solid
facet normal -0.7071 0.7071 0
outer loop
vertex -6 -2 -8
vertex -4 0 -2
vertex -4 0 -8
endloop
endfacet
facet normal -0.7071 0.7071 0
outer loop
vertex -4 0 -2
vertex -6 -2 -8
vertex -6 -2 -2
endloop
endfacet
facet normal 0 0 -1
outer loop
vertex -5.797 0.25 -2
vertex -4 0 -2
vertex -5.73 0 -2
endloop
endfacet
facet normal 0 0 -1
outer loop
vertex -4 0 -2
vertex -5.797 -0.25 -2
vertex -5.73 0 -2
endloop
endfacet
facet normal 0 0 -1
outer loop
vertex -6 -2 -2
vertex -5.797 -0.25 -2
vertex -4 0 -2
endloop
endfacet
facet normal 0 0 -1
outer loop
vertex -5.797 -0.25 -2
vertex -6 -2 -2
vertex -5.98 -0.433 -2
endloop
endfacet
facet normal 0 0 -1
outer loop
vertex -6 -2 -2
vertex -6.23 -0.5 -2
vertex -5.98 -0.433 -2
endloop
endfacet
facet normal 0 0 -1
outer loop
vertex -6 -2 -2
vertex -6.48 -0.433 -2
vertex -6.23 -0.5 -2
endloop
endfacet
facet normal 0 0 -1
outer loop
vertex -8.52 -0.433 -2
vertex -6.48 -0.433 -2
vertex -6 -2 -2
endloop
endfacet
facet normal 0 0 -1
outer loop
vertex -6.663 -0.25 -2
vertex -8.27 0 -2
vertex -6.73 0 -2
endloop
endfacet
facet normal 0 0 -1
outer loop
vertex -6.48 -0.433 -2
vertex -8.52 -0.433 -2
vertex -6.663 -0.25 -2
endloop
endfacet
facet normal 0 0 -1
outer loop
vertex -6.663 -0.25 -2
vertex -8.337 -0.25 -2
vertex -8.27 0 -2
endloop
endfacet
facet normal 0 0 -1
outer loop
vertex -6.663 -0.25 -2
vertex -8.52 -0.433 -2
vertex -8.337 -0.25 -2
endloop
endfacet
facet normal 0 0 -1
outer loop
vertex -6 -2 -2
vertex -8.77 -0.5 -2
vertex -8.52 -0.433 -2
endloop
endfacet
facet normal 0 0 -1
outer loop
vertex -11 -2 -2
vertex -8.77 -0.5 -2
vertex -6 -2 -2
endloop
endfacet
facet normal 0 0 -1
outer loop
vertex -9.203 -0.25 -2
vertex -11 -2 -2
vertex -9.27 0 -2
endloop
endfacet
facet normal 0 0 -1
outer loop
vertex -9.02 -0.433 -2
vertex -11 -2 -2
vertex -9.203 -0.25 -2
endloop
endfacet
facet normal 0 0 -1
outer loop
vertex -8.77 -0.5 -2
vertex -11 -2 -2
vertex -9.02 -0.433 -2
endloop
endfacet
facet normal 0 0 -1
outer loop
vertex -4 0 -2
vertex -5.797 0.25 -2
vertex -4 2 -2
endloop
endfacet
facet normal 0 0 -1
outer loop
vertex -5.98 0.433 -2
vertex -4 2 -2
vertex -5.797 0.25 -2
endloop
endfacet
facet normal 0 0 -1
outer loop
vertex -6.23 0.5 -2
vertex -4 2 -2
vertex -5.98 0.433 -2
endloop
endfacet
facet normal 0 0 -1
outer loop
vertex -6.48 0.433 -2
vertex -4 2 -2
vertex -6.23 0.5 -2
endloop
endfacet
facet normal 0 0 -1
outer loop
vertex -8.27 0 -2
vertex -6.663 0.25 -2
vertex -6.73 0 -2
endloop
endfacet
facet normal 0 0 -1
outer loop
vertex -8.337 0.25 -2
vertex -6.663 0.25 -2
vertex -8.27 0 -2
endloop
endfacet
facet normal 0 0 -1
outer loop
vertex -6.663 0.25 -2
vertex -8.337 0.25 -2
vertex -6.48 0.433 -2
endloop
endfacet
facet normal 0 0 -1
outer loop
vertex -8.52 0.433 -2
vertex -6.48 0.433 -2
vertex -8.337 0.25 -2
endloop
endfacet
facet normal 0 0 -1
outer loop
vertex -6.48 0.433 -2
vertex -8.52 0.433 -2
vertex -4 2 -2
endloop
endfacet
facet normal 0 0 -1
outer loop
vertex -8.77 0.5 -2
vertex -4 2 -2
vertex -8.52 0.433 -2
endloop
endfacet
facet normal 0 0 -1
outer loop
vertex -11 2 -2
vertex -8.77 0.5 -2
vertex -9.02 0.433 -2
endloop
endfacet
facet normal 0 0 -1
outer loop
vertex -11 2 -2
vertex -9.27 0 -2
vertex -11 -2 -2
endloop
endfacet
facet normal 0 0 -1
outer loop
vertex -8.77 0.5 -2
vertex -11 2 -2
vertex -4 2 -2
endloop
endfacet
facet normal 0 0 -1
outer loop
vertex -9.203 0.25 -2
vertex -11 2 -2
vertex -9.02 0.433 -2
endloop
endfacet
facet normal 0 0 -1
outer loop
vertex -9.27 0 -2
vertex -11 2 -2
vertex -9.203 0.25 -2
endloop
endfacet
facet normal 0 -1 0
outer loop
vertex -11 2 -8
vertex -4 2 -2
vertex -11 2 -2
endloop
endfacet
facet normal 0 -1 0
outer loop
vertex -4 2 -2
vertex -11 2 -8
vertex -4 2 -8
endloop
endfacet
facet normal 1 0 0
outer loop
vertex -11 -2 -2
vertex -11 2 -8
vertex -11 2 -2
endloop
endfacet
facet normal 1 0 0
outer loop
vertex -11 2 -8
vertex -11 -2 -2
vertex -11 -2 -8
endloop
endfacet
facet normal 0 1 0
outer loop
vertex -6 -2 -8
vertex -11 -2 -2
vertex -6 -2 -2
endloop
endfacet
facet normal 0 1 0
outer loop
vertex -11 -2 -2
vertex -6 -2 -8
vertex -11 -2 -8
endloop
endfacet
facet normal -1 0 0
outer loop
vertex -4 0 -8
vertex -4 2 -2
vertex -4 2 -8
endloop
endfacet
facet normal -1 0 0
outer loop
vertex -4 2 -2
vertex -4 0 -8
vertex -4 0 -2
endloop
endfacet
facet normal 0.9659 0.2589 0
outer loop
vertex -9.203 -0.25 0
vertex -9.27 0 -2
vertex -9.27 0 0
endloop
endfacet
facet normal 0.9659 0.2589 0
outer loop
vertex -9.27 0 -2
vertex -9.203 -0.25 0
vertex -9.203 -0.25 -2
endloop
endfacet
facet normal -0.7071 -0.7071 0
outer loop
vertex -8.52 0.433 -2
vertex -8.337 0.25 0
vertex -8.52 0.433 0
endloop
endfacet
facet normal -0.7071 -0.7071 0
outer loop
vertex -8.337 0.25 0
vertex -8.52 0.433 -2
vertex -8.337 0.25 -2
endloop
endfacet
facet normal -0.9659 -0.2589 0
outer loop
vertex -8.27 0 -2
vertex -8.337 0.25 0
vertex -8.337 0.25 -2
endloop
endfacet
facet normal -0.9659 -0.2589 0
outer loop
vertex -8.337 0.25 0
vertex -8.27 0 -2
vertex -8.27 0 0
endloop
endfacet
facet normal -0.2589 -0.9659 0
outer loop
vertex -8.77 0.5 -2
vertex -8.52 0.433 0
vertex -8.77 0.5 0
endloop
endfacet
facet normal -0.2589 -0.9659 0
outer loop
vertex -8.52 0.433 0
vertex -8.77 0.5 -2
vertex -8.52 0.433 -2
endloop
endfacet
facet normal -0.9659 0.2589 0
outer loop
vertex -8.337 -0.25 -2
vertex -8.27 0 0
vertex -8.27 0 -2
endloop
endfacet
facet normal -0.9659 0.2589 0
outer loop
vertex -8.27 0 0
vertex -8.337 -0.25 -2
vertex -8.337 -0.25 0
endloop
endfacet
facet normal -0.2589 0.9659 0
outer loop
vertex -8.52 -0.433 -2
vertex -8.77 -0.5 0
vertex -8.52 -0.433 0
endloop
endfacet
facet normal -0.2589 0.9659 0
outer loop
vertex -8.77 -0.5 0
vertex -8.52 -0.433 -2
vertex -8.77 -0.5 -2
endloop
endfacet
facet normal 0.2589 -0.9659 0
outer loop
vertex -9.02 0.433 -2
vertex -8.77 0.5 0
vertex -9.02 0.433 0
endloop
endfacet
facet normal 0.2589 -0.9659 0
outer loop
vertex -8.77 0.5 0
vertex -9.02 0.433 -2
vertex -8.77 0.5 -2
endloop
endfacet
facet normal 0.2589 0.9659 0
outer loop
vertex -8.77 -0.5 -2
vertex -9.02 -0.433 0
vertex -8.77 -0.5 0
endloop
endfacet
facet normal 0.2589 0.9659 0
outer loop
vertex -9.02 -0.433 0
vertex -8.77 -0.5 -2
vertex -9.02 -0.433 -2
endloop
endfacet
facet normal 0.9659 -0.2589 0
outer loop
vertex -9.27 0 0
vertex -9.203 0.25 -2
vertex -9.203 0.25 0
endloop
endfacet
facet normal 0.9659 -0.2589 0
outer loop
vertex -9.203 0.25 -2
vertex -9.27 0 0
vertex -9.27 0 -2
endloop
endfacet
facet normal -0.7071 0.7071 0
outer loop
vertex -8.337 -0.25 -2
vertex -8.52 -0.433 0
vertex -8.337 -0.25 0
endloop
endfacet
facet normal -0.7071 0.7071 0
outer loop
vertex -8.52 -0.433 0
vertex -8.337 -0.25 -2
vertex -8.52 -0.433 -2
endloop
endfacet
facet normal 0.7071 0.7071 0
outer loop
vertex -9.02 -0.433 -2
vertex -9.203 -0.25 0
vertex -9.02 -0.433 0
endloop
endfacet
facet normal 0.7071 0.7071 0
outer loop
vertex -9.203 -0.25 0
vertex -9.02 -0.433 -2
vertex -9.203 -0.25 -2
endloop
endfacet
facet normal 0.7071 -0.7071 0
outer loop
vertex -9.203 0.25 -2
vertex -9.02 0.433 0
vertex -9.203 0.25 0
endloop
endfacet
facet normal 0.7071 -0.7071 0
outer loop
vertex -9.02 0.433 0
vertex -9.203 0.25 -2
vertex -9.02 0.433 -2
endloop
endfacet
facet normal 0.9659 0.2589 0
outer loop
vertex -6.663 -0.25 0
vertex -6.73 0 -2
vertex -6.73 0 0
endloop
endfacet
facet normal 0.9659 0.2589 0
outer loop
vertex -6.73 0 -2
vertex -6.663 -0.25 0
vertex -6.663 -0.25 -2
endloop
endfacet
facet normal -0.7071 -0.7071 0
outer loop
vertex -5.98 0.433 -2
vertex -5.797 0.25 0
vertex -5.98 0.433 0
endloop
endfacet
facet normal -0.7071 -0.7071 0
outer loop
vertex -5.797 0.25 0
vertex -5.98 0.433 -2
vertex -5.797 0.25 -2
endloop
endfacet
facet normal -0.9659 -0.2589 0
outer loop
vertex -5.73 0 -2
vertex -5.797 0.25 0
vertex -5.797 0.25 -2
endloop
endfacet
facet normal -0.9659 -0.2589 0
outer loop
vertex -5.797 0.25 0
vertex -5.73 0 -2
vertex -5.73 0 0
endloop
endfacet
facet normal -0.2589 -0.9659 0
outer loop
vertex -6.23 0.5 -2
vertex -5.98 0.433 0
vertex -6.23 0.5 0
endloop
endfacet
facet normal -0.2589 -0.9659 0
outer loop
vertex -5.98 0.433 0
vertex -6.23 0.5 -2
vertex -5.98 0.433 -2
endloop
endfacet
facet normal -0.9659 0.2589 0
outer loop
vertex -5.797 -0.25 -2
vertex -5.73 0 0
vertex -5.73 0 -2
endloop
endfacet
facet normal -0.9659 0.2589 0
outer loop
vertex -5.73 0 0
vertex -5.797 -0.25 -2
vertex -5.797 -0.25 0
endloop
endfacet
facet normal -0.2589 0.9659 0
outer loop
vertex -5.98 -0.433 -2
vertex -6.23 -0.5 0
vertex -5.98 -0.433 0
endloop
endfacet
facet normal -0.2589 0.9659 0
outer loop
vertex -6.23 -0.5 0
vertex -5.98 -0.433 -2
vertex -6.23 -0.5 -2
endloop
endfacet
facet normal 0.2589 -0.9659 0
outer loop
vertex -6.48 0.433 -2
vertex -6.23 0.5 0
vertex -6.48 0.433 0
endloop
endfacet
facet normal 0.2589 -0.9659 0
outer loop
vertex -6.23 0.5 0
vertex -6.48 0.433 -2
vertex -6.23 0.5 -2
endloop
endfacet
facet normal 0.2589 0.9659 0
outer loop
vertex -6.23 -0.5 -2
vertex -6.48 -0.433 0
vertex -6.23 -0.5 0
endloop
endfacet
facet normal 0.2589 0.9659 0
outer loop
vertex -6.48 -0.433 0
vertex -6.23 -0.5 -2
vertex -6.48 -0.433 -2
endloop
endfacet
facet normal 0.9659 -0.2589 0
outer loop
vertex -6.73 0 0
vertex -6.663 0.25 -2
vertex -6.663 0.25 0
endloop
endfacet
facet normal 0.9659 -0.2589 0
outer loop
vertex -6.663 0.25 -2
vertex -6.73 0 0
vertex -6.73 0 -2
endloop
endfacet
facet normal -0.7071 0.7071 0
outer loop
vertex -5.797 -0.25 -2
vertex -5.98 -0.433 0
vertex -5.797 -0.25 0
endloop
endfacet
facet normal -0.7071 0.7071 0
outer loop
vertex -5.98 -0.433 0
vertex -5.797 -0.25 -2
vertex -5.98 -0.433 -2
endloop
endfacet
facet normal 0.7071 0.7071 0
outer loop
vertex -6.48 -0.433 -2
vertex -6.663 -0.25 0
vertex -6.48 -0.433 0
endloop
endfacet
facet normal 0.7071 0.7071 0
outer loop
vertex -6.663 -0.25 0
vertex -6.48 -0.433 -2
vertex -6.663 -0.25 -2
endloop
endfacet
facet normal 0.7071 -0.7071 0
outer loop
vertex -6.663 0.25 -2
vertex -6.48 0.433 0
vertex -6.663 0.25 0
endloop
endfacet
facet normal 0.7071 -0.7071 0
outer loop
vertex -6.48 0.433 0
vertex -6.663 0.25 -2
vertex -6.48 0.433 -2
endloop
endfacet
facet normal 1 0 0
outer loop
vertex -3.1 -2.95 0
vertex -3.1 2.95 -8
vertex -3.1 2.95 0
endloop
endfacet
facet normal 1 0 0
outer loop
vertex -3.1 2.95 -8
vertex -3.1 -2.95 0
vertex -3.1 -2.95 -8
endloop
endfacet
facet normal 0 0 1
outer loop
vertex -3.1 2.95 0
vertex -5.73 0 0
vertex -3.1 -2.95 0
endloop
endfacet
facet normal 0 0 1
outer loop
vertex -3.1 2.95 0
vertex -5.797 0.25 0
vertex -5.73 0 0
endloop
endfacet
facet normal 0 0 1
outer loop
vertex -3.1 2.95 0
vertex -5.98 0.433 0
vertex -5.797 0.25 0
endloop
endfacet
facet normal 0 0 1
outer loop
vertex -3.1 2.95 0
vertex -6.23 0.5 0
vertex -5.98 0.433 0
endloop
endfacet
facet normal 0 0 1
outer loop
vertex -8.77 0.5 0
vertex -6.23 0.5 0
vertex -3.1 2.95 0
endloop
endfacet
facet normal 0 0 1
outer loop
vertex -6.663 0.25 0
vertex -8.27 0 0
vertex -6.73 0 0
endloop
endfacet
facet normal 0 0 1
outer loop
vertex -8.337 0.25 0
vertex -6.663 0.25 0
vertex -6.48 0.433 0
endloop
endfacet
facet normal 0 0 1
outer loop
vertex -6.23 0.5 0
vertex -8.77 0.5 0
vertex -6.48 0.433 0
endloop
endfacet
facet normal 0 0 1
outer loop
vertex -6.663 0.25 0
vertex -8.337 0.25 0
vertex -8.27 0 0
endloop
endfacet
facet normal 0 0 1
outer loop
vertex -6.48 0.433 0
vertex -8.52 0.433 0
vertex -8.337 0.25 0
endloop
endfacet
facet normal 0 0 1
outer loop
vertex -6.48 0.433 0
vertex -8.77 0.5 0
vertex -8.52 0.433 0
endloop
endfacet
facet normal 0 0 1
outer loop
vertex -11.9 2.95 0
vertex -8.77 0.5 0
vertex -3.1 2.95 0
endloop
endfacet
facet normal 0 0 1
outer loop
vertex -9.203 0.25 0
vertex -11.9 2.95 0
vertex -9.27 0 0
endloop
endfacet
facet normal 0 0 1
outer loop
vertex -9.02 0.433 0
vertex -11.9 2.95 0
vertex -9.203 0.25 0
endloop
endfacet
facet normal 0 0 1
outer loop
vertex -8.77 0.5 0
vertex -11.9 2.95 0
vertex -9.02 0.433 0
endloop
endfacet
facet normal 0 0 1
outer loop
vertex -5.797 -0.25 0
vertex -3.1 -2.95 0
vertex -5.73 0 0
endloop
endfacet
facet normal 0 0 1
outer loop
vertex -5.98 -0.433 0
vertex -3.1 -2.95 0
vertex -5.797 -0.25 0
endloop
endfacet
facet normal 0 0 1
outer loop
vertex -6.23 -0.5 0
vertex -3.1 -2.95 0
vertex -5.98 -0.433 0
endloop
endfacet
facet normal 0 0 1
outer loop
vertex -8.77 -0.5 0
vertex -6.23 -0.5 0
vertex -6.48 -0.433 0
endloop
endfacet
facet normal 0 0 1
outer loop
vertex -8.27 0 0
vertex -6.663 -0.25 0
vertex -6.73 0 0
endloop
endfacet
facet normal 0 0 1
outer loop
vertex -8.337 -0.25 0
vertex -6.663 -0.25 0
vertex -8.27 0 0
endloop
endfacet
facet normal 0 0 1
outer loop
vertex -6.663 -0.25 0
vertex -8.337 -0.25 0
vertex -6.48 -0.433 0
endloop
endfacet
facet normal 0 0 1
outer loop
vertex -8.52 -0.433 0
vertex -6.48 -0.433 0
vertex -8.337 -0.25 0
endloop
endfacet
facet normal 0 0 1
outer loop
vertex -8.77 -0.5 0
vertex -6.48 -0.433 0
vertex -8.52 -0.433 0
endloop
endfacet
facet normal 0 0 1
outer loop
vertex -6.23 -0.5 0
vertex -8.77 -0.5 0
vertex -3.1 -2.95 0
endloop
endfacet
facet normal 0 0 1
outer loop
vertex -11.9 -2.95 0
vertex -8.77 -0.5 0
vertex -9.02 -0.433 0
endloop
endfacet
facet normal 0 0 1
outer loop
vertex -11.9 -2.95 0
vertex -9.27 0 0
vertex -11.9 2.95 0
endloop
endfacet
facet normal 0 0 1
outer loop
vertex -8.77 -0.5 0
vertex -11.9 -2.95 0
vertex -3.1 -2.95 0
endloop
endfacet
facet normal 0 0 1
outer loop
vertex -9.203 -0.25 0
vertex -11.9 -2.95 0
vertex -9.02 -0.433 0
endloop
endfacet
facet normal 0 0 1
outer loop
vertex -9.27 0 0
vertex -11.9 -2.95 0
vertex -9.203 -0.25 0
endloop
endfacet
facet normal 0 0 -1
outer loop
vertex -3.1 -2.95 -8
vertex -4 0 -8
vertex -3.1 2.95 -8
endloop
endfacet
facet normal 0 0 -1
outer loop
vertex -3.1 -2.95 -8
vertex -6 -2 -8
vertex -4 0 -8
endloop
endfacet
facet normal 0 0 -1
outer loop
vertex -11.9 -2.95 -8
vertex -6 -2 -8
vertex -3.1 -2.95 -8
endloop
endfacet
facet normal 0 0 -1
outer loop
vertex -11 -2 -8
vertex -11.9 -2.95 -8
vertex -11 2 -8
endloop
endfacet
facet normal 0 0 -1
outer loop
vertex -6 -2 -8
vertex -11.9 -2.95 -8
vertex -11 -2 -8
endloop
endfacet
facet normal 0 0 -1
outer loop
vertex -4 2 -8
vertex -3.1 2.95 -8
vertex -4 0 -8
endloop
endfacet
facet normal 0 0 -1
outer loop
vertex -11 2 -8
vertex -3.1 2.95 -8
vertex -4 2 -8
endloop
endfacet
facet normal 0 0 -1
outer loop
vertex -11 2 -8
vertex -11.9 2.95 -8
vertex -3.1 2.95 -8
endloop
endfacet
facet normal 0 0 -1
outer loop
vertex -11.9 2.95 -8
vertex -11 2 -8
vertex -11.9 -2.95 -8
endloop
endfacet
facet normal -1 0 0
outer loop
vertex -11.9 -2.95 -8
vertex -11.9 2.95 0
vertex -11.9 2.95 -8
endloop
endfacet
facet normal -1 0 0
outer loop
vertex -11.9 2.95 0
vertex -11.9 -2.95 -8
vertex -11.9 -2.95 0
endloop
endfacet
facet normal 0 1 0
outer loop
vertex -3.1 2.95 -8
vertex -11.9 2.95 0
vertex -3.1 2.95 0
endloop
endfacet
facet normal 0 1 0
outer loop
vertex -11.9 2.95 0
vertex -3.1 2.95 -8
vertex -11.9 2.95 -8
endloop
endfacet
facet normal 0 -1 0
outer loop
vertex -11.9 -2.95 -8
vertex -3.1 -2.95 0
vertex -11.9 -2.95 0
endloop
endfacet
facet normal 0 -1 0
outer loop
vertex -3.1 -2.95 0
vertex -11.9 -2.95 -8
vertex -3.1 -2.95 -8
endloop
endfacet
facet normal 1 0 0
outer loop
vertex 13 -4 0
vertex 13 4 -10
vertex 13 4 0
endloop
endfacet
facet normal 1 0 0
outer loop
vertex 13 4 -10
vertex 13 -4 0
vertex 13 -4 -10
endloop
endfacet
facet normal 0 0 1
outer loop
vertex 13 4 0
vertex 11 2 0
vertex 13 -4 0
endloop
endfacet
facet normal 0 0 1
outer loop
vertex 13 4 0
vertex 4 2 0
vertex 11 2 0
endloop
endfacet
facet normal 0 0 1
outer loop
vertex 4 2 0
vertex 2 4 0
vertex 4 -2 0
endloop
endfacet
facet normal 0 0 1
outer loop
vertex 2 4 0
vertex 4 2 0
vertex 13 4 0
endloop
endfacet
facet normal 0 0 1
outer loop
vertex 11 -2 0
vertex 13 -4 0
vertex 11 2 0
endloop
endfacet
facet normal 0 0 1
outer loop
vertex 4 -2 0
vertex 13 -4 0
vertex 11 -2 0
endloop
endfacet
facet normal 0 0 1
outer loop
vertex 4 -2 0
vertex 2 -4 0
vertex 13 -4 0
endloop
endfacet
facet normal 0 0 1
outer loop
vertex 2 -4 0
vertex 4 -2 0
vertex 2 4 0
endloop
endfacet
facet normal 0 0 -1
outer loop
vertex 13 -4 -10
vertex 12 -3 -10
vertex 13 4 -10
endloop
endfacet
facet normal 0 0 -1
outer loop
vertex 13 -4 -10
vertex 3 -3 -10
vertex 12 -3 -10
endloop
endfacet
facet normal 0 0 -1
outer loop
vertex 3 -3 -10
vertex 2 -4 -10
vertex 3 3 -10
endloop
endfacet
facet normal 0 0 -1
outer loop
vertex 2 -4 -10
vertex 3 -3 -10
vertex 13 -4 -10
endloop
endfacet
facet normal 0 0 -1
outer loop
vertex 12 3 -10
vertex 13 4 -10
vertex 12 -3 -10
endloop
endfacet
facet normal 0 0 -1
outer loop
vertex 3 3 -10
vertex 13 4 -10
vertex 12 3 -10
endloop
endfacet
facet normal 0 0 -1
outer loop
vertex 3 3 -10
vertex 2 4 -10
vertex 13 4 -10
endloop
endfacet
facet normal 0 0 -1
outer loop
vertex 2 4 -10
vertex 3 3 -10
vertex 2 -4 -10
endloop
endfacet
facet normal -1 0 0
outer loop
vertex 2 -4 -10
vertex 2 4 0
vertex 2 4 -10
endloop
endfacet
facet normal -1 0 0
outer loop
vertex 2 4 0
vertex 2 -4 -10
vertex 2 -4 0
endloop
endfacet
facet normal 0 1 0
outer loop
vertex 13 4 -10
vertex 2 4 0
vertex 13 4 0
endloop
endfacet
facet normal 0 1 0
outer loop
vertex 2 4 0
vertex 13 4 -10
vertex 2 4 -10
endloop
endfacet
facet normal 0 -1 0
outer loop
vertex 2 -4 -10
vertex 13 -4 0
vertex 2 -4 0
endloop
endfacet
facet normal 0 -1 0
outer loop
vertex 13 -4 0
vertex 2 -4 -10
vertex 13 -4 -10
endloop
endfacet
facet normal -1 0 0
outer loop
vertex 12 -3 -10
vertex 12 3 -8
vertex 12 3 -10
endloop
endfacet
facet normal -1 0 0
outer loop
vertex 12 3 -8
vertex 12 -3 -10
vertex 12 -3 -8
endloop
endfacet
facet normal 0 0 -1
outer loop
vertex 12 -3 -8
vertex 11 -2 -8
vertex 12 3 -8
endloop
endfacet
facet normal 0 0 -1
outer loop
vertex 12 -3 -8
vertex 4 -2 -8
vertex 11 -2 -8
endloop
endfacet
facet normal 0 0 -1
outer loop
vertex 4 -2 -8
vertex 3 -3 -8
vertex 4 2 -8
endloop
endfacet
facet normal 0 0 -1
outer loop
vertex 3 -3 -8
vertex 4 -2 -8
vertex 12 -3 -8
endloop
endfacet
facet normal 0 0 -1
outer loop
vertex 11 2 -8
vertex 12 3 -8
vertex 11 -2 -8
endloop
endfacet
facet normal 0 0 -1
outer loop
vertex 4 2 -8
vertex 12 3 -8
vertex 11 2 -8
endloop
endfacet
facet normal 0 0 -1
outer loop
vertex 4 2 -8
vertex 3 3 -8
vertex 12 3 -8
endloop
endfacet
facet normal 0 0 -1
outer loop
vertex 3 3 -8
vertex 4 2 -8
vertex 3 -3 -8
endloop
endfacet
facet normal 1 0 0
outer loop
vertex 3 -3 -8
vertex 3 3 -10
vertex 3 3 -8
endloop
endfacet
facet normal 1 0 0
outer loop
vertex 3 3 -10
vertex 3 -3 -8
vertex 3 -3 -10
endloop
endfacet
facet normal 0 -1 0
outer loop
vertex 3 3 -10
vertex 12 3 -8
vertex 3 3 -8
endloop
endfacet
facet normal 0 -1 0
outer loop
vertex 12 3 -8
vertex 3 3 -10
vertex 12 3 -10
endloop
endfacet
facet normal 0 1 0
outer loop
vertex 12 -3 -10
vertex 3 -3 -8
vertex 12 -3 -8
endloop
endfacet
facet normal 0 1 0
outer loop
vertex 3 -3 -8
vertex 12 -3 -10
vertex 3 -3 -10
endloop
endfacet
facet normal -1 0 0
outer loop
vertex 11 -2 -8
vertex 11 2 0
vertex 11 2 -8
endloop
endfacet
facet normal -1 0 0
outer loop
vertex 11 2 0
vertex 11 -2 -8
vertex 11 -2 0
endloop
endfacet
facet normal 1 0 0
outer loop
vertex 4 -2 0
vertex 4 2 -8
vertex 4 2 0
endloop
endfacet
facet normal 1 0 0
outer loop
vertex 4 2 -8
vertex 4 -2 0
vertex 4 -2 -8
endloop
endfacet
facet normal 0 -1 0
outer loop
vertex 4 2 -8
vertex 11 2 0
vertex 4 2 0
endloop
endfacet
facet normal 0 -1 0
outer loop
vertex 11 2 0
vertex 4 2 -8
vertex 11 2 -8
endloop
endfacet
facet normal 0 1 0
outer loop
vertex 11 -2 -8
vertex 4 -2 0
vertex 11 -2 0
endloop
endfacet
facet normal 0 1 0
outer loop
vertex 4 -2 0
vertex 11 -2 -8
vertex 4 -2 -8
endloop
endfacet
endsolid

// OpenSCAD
translate([ -7.5, 0.0, -4.0 ])
difference()
{
	cube([ 8.8, 5.9, 8.0 ], center = true);
	translate([ 0.0, 0.0, -6.0 ])
	union()
	{
		linear_extrude(8.0) polygon([ [ -3.5, -2.0 ], [ 1.5, -2.0 ], [ 3.5, 0.0 ], [ 3.5, 2.0 ], [ -3.5, 2.0 ] ]);
		translate([ -1.27, 0.0, 0.0 ])
		cylinder($fn = 12, d = 1, h = 12);
		translate([ 1.27, 0.0, 0.0 ])
		cylinder($fn = 12, d = 1, h = 12);
	}
}

translate([7.5, 0.0, -5.0])
difference()
{
	cube([ 11.0, 8.0, 10.0 ], center = true);
	translate([ 0.0, 0.0, -5.0 ])
	cube([ 9.0, 6.0, 4.0 ], center = true);
	cube([ 7.0, 4.0, 12.0 ], center = true);
}
